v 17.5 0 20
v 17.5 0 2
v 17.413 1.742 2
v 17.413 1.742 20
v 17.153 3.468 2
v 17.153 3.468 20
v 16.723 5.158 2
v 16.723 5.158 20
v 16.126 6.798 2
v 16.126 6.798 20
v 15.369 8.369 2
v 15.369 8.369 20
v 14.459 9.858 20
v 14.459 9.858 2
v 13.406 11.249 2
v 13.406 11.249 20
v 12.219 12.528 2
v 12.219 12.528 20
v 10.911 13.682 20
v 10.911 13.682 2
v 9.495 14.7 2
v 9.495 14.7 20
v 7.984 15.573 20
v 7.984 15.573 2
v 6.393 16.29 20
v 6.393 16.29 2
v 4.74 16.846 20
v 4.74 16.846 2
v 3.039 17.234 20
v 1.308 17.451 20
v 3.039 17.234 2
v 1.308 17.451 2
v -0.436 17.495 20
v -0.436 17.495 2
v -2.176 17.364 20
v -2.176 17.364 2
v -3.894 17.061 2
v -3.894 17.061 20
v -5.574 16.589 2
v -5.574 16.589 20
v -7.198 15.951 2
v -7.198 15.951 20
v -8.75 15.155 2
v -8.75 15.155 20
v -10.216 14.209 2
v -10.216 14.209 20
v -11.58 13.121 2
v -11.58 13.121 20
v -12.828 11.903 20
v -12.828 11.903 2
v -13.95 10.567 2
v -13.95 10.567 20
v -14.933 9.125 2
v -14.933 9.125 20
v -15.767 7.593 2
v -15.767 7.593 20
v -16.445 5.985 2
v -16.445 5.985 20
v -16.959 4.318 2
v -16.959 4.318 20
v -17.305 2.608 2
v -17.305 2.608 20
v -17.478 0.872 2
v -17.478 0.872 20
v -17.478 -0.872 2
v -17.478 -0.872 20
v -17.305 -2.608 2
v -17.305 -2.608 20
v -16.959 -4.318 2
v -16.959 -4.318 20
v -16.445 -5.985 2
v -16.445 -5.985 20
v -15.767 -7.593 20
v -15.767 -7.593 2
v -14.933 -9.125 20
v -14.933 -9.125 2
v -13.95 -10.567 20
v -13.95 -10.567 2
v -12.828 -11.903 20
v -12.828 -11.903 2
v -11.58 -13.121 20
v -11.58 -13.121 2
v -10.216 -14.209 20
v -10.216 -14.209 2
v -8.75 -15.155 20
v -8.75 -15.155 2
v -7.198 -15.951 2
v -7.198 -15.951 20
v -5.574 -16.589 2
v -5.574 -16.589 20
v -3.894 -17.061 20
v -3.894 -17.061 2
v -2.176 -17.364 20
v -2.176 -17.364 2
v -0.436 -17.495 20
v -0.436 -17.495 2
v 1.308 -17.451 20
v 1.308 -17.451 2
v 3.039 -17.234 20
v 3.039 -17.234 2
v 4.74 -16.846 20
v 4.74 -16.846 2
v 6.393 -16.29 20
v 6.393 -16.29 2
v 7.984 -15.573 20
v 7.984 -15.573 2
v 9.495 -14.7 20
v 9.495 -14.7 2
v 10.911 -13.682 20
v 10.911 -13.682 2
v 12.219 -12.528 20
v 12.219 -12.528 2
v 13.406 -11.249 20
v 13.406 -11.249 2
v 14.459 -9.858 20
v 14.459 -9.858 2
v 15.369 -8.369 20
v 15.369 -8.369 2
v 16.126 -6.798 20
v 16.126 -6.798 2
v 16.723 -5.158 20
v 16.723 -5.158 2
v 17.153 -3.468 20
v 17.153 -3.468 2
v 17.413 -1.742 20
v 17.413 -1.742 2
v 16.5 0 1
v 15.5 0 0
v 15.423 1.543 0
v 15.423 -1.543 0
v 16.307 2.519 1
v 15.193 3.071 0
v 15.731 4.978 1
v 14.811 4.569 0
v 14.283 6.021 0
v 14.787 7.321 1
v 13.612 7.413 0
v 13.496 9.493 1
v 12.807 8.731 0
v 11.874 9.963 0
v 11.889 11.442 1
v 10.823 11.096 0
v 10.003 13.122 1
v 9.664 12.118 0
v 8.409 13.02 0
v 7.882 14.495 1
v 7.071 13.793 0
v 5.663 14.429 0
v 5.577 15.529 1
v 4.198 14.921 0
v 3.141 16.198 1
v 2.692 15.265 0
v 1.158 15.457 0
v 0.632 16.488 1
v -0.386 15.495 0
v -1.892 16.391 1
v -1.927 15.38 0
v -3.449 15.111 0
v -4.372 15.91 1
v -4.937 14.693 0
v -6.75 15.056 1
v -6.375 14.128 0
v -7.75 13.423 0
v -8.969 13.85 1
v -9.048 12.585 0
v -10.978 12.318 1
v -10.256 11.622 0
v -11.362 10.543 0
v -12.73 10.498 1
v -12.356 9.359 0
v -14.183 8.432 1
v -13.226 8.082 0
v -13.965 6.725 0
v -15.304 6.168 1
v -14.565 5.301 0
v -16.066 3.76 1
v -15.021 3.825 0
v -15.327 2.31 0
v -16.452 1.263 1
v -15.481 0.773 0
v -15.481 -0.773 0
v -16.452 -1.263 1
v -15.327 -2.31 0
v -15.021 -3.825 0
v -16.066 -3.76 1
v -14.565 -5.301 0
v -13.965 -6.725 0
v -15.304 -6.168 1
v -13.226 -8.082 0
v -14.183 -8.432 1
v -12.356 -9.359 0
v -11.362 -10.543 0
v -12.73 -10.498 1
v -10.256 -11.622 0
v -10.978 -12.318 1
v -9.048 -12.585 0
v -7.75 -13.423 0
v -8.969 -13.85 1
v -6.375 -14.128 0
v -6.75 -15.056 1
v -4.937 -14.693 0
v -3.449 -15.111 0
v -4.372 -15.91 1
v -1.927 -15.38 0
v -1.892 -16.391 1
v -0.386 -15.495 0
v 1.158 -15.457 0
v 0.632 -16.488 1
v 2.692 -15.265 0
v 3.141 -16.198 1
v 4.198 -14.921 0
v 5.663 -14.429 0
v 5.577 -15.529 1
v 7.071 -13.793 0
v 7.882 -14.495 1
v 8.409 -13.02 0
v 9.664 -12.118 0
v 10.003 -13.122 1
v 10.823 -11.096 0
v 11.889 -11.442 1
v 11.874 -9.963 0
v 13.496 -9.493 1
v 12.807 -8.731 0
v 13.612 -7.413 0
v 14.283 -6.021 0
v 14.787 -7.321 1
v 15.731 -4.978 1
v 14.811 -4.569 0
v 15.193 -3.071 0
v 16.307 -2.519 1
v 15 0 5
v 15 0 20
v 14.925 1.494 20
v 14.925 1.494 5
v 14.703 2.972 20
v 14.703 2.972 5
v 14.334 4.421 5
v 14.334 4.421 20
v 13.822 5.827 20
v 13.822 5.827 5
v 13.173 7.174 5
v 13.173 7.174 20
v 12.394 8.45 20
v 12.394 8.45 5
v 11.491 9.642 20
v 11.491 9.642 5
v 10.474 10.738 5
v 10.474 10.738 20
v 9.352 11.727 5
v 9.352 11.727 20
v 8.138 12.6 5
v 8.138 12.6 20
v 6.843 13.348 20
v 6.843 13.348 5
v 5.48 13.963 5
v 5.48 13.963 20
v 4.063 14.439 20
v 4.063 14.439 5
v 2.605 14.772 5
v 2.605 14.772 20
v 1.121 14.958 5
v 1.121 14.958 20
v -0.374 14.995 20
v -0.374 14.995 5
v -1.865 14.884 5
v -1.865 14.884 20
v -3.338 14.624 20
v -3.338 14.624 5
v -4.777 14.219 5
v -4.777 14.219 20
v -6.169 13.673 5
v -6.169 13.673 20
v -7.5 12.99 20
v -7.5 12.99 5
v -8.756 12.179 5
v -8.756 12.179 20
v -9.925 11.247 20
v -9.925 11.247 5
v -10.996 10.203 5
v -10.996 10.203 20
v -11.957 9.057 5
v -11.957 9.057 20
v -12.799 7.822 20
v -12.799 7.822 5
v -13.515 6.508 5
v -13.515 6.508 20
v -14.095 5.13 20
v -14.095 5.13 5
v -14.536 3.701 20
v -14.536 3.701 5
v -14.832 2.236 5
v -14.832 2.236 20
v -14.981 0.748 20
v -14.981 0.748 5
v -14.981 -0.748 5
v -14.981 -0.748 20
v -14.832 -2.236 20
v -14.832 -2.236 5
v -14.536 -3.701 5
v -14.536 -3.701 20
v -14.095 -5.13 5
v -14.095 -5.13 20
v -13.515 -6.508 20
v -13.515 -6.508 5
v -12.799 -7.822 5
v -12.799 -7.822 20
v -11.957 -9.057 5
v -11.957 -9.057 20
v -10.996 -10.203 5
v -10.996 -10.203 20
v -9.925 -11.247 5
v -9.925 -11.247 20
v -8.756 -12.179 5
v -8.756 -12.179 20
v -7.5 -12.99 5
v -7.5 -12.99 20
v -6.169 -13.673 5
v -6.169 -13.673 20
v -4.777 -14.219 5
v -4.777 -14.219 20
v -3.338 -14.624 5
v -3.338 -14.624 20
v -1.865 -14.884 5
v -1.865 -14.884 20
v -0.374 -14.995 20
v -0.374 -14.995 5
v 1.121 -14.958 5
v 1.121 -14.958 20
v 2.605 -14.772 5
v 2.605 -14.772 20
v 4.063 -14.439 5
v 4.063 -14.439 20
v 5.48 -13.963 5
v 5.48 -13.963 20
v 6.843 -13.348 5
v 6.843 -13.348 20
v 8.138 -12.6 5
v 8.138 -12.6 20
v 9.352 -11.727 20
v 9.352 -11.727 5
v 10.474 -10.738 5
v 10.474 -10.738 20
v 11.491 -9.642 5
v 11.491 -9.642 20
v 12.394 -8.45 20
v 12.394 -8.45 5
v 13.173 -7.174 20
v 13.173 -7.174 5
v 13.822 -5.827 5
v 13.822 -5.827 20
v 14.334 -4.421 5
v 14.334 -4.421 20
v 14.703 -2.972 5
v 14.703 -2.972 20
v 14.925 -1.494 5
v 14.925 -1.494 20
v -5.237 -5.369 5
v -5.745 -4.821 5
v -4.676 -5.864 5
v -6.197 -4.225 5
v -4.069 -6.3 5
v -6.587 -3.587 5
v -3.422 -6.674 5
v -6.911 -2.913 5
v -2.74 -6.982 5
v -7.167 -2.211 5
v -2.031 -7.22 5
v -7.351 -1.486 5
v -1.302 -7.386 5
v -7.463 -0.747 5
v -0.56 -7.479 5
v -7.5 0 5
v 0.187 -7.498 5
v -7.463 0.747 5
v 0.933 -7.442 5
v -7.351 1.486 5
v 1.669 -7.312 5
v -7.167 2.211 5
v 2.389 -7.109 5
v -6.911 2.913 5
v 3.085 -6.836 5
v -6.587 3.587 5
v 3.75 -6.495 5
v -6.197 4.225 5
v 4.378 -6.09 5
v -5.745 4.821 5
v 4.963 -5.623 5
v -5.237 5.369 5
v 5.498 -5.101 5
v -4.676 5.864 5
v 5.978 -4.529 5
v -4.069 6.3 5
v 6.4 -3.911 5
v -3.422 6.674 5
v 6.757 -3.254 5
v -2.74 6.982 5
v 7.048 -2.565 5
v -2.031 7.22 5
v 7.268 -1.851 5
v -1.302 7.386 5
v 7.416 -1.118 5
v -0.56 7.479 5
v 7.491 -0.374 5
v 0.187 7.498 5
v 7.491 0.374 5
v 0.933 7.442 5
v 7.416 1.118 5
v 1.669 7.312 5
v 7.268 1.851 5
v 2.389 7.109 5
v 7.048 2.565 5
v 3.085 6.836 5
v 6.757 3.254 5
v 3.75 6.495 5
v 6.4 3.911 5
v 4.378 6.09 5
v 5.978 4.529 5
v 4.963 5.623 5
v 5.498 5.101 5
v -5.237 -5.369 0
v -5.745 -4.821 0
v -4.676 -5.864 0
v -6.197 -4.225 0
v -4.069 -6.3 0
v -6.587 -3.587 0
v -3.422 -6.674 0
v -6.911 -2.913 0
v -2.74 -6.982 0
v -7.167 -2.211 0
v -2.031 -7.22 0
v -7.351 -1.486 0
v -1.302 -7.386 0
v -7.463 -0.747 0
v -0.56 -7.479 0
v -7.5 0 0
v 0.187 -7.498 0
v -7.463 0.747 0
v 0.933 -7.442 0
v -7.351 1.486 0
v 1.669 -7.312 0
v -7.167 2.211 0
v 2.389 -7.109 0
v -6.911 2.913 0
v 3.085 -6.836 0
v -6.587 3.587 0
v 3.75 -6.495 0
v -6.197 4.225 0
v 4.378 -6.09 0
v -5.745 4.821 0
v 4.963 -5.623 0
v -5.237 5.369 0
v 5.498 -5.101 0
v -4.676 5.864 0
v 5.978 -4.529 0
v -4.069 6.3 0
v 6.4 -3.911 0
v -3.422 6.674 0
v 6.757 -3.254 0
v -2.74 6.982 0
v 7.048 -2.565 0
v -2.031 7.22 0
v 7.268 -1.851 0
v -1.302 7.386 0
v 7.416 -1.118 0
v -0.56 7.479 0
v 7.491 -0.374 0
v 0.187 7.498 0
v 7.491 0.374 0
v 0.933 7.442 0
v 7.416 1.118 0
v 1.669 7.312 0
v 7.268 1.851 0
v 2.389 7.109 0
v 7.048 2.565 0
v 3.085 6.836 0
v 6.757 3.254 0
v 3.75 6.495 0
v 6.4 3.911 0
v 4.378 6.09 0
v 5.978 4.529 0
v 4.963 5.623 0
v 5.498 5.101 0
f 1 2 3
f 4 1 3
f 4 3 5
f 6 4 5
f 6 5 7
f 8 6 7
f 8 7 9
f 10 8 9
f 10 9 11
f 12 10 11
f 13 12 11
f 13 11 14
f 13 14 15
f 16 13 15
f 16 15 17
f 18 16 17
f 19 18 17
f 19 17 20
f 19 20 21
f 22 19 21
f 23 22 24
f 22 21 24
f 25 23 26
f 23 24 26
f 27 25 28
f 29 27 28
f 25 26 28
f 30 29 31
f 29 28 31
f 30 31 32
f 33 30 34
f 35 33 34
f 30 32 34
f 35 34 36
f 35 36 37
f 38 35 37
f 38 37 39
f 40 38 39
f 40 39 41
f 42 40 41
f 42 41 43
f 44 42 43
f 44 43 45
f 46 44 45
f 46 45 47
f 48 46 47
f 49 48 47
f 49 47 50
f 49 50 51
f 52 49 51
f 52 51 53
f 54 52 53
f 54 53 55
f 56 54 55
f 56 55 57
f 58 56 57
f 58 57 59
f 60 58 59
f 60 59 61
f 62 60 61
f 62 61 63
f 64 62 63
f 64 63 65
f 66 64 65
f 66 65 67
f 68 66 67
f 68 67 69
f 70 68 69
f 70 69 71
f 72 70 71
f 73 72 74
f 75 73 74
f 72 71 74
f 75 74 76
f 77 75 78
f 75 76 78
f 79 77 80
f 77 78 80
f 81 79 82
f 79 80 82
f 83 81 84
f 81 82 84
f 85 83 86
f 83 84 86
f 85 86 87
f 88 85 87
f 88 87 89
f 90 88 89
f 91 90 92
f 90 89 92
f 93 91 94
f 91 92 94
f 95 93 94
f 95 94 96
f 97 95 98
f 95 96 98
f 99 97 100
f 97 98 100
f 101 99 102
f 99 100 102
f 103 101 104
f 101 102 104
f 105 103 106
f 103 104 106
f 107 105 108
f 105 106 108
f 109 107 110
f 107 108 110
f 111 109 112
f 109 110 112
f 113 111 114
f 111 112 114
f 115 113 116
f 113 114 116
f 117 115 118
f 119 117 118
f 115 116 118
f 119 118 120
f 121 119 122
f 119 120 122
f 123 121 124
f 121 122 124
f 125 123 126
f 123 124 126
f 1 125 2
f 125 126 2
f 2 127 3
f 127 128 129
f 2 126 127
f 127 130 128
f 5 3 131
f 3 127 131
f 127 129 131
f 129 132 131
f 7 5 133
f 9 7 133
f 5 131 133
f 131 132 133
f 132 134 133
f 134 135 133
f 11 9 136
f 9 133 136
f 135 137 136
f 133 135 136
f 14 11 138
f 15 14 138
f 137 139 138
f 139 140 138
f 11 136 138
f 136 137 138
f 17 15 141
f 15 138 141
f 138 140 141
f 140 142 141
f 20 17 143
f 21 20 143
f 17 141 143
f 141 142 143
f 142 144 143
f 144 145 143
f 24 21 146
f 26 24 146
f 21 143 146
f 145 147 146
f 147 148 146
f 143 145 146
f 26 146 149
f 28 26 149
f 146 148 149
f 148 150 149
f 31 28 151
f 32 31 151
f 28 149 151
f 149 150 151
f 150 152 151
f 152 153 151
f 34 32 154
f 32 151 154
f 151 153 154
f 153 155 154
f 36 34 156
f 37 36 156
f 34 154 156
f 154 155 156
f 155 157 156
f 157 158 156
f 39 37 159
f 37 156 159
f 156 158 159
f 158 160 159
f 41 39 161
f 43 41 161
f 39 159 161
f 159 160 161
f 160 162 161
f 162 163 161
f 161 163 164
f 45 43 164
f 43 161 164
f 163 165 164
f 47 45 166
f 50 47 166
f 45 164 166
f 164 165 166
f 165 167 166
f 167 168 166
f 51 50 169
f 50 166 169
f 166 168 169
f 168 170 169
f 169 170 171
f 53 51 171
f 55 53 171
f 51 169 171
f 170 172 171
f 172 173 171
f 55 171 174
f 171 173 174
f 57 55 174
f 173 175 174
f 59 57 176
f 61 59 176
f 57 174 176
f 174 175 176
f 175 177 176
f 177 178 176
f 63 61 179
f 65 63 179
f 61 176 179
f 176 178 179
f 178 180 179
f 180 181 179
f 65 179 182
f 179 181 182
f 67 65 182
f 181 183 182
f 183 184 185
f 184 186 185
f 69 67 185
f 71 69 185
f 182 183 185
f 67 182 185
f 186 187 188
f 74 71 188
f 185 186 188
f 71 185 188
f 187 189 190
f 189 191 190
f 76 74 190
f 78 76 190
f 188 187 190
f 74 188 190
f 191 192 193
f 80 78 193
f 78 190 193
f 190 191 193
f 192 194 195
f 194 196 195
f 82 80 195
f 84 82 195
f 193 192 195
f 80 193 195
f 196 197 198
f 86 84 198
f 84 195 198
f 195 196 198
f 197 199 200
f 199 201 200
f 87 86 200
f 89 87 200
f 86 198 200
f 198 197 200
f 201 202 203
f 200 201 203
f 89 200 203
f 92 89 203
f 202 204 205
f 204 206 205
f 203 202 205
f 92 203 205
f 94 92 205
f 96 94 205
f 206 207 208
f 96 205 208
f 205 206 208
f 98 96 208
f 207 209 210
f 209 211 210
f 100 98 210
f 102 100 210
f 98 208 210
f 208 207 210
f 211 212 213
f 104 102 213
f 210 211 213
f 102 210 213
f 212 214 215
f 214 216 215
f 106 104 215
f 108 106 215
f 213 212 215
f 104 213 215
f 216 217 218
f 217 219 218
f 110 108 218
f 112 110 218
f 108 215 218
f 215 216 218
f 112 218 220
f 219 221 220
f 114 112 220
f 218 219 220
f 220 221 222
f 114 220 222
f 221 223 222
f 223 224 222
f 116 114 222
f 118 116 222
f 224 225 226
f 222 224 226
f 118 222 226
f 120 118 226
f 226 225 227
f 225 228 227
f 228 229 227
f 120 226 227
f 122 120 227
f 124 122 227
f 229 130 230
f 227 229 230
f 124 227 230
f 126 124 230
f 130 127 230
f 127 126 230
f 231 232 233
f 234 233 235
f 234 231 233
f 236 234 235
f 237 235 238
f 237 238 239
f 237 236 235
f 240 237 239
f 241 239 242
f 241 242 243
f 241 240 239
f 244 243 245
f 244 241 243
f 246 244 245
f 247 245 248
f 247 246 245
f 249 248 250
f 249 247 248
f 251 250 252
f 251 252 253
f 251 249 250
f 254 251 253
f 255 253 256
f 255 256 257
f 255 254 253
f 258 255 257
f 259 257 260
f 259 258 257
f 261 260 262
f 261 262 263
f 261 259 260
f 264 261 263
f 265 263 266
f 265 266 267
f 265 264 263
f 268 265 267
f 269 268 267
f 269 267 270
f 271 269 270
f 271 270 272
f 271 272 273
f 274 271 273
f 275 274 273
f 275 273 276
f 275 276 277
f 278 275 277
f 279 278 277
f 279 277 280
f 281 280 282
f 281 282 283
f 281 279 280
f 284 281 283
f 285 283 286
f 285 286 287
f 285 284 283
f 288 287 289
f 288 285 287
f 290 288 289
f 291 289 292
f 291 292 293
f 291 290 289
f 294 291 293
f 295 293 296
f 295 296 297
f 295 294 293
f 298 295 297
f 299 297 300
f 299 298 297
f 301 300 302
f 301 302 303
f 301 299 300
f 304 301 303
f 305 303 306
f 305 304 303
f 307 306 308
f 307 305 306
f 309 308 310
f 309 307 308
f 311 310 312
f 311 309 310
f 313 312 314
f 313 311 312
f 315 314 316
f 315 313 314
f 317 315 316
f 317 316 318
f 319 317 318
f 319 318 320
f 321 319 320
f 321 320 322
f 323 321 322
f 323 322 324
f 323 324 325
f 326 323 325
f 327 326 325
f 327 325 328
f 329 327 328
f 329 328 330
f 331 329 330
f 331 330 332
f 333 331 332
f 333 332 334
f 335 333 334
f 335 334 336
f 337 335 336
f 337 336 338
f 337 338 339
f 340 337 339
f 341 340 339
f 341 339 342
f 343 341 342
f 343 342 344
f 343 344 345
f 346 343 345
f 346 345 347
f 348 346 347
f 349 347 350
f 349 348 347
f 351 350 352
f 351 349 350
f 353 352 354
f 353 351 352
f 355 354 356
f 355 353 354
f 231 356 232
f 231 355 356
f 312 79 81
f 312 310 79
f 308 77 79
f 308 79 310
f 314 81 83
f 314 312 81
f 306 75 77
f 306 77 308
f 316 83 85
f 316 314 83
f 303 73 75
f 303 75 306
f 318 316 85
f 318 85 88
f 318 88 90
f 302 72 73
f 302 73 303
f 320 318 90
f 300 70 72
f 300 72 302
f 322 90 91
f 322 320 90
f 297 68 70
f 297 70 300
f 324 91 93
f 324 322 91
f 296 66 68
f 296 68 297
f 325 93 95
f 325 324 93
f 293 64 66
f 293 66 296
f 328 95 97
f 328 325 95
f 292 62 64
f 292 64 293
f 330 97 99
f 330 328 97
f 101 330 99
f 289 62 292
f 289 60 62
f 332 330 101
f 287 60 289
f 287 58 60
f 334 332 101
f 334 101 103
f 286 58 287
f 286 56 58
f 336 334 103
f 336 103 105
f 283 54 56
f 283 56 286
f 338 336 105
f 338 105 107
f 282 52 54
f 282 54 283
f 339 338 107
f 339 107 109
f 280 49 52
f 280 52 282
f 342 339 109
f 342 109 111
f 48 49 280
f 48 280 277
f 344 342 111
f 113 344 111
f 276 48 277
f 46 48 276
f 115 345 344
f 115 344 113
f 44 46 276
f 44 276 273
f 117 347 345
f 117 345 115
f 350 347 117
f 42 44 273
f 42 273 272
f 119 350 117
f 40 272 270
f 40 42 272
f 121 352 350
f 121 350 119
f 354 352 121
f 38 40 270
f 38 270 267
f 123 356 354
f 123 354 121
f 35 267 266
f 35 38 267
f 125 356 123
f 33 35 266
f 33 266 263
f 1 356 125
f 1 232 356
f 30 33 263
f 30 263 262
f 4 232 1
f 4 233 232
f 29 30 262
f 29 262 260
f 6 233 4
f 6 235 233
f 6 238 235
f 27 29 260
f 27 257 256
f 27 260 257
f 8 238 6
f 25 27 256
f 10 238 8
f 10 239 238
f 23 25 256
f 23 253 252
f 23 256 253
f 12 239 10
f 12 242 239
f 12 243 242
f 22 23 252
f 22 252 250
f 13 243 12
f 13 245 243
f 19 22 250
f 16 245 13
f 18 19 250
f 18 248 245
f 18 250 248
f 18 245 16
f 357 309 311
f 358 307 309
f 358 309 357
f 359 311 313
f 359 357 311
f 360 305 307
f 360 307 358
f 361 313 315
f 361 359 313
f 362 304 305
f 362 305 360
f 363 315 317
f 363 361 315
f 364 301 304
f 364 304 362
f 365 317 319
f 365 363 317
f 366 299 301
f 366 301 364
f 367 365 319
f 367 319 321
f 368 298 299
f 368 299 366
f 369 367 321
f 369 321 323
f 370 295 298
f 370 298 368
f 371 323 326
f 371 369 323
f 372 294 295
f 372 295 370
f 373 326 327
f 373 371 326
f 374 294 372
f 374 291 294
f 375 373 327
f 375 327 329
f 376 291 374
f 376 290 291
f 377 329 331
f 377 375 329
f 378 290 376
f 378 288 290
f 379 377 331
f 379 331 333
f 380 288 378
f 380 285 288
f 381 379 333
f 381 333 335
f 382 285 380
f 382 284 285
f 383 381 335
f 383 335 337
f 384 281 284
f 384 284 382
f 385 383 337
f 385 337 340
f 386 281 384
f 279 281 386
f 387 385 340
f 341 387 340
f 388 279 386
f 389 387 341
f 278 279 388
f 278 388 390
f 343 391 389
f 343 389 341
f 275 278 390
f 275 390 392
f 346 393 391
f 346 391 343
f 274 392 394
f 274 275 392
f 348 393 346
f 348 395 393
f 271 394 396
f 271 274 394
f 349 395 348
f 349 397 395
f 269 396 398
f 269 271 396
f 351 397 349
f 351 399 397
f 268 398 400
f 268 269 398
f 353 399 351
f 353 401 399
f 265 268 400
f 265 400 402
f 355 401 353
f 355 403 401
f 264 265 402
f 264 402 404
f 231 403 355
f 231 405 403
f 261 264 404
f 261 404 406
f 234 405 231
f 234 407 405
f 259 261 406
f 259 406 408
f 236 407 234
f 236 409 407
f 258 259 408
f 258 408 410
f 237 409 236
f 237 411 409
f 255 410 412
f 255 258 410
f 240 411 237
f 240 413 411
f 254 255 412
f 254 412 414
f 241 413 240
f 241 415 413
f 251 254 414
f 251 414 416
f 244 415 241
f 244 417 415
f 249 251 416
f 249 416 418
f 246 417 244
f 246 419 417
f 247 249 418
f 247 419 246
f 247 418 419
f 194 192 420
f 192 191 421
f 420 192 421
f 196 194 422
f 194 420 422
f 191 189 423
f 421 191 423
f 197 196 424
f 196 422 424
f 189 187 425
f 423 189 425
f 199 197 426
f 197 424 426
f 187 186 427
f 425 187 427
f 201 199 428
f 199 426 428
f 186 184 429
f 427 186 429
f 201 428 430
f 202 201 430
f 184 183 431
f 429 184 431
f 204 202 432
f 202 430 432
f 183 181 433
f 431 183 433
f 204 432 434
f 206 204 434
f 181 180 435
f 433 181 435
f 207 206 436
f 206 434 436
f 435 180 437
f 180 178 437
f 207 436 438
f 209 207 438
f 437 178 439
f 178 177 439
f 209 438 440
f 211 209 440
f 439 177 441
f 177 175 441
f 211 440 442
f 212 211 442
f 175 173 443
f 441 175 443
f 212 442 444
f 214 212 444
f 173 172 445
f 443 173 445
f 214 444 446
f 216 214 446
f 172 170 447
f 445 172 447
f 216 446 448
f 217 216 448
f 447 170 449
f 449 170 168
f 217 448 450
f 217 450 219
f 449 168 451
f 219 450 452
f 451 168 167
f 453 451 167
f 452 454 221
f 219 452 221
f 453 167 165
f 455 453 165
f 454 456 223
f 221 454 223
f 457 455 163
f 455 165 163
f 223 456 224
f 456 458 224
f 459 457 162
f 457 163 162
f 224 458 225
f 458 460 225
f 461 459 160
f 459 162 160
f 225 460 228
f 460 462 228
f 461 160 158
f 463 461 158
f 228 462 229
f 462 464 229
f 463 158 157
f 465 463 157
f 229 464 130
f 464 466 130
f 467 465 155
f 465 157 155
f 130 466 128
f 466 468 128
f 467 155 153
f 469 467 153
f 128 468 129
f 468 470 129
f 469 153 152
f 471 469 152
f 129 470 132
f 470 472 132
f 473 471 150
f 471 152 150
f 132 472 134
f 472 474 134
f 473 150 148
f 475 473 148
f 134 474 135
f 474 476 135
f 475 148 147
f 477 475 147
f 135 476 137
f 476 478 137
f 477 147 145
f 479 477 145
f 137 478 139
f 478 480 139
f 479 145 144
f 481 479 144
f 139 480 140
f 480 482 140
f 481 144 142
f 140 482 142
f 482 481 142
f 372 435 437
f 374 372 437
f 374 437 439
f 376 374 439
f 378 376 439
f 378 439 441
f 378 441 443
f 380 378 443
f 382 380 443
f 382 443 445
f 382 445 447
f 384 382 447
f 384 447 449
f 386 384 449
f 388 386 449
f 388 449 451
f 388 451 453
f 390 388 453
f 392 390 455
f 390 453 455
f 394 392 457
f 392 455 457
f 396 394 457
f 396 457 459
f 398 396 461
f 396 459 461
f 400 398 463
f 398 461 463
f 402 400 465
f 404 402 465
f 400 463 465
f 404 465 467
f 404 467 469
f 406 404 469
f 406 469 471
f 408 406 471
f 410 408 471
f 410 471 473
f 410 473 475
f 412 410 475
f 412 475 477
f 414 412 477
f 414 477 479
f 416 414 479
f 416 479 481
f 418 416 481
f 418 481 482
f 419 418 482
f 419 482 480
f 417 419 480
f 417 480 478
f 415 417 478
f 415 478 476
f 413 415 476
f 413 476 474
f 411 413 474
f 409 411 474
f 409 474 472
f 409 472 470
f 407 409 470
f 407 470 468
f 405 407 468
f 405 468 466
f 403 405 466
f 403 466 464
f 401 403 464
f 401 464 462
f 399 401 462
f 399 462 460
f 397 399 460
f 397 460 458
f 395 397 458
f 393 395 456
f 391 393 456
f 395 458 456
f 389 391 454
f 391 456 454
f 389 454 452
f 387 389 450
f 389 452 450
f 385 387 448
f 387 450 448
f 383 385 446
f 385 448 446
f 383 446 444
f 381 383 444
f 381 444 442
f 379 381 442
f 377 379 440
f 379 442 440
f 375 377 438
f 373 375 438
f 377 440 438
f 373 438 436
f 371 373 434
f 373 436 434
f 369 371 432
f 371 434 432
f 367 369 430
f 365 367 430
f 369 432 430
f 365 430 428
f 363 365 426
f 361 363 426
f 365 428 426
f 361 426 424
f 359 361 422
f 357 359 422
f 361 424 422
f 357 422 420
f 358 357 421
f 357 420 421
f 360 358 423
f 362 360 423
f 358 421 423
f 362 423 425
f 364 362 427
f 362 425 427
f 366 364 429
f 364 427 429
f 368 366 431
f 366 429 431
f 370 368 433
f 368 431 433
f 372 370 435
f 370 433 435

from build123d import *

# Parameters (mm, degrees)
SKETCH1_R           = 17.5
BOSS_EXTRUDE1_DEPTH = 5
SKETCH2_R           = 17.5
SKETCH2_R_2         = 15
BOSS_EXTRUDE2_DEPTH = 15
SKETCH3_R           = 7.5
CUT_EXTRUDE1_DEPTH  = 21
CHAMFER1_SIZE       = 2


with BuildPart() as part:
    # Sketch1 → Boss-Extrude1 (new body)
    with BuildSketch(Plane.XY):
        Circle(SKETCH1_R)
    extrude(amount=BOSS_EXTRUDE1_DEPTH)

    # Sketch2 → Boss-Extrude2 (add)
    with BuildSketch(Plane.XY.offset(5)):
        Circle(SKETCH2_R)
        Circle(SKETCH2_R_2, mode=Mode.SUBTRACT)
    extrude(amount=BOSS_EXTRUDE2_DEPTH)

    # Sketch3 → Cut-Extrude1 (cut, through all)
    with BuildSketch(Plane(origin=(0, 0, 0), x_dir=(-1, 0, 0), z_dir=(0, 0, -1))):
        Circle(SKETCH3_R)
    extrude(amount=-CUT_EXTRUDE1_DEPTH, mode=Mode.SUBTRACT)

    # Chamfer1
    chamfer1_edges = [part.edges().sort_by_distance(p)[0] for p in [
        (-17.5, 0, 0),
    ]]
    chamfer(chamfer1_edges, length=CHAMFER1_SIZE)


solid = part.part
